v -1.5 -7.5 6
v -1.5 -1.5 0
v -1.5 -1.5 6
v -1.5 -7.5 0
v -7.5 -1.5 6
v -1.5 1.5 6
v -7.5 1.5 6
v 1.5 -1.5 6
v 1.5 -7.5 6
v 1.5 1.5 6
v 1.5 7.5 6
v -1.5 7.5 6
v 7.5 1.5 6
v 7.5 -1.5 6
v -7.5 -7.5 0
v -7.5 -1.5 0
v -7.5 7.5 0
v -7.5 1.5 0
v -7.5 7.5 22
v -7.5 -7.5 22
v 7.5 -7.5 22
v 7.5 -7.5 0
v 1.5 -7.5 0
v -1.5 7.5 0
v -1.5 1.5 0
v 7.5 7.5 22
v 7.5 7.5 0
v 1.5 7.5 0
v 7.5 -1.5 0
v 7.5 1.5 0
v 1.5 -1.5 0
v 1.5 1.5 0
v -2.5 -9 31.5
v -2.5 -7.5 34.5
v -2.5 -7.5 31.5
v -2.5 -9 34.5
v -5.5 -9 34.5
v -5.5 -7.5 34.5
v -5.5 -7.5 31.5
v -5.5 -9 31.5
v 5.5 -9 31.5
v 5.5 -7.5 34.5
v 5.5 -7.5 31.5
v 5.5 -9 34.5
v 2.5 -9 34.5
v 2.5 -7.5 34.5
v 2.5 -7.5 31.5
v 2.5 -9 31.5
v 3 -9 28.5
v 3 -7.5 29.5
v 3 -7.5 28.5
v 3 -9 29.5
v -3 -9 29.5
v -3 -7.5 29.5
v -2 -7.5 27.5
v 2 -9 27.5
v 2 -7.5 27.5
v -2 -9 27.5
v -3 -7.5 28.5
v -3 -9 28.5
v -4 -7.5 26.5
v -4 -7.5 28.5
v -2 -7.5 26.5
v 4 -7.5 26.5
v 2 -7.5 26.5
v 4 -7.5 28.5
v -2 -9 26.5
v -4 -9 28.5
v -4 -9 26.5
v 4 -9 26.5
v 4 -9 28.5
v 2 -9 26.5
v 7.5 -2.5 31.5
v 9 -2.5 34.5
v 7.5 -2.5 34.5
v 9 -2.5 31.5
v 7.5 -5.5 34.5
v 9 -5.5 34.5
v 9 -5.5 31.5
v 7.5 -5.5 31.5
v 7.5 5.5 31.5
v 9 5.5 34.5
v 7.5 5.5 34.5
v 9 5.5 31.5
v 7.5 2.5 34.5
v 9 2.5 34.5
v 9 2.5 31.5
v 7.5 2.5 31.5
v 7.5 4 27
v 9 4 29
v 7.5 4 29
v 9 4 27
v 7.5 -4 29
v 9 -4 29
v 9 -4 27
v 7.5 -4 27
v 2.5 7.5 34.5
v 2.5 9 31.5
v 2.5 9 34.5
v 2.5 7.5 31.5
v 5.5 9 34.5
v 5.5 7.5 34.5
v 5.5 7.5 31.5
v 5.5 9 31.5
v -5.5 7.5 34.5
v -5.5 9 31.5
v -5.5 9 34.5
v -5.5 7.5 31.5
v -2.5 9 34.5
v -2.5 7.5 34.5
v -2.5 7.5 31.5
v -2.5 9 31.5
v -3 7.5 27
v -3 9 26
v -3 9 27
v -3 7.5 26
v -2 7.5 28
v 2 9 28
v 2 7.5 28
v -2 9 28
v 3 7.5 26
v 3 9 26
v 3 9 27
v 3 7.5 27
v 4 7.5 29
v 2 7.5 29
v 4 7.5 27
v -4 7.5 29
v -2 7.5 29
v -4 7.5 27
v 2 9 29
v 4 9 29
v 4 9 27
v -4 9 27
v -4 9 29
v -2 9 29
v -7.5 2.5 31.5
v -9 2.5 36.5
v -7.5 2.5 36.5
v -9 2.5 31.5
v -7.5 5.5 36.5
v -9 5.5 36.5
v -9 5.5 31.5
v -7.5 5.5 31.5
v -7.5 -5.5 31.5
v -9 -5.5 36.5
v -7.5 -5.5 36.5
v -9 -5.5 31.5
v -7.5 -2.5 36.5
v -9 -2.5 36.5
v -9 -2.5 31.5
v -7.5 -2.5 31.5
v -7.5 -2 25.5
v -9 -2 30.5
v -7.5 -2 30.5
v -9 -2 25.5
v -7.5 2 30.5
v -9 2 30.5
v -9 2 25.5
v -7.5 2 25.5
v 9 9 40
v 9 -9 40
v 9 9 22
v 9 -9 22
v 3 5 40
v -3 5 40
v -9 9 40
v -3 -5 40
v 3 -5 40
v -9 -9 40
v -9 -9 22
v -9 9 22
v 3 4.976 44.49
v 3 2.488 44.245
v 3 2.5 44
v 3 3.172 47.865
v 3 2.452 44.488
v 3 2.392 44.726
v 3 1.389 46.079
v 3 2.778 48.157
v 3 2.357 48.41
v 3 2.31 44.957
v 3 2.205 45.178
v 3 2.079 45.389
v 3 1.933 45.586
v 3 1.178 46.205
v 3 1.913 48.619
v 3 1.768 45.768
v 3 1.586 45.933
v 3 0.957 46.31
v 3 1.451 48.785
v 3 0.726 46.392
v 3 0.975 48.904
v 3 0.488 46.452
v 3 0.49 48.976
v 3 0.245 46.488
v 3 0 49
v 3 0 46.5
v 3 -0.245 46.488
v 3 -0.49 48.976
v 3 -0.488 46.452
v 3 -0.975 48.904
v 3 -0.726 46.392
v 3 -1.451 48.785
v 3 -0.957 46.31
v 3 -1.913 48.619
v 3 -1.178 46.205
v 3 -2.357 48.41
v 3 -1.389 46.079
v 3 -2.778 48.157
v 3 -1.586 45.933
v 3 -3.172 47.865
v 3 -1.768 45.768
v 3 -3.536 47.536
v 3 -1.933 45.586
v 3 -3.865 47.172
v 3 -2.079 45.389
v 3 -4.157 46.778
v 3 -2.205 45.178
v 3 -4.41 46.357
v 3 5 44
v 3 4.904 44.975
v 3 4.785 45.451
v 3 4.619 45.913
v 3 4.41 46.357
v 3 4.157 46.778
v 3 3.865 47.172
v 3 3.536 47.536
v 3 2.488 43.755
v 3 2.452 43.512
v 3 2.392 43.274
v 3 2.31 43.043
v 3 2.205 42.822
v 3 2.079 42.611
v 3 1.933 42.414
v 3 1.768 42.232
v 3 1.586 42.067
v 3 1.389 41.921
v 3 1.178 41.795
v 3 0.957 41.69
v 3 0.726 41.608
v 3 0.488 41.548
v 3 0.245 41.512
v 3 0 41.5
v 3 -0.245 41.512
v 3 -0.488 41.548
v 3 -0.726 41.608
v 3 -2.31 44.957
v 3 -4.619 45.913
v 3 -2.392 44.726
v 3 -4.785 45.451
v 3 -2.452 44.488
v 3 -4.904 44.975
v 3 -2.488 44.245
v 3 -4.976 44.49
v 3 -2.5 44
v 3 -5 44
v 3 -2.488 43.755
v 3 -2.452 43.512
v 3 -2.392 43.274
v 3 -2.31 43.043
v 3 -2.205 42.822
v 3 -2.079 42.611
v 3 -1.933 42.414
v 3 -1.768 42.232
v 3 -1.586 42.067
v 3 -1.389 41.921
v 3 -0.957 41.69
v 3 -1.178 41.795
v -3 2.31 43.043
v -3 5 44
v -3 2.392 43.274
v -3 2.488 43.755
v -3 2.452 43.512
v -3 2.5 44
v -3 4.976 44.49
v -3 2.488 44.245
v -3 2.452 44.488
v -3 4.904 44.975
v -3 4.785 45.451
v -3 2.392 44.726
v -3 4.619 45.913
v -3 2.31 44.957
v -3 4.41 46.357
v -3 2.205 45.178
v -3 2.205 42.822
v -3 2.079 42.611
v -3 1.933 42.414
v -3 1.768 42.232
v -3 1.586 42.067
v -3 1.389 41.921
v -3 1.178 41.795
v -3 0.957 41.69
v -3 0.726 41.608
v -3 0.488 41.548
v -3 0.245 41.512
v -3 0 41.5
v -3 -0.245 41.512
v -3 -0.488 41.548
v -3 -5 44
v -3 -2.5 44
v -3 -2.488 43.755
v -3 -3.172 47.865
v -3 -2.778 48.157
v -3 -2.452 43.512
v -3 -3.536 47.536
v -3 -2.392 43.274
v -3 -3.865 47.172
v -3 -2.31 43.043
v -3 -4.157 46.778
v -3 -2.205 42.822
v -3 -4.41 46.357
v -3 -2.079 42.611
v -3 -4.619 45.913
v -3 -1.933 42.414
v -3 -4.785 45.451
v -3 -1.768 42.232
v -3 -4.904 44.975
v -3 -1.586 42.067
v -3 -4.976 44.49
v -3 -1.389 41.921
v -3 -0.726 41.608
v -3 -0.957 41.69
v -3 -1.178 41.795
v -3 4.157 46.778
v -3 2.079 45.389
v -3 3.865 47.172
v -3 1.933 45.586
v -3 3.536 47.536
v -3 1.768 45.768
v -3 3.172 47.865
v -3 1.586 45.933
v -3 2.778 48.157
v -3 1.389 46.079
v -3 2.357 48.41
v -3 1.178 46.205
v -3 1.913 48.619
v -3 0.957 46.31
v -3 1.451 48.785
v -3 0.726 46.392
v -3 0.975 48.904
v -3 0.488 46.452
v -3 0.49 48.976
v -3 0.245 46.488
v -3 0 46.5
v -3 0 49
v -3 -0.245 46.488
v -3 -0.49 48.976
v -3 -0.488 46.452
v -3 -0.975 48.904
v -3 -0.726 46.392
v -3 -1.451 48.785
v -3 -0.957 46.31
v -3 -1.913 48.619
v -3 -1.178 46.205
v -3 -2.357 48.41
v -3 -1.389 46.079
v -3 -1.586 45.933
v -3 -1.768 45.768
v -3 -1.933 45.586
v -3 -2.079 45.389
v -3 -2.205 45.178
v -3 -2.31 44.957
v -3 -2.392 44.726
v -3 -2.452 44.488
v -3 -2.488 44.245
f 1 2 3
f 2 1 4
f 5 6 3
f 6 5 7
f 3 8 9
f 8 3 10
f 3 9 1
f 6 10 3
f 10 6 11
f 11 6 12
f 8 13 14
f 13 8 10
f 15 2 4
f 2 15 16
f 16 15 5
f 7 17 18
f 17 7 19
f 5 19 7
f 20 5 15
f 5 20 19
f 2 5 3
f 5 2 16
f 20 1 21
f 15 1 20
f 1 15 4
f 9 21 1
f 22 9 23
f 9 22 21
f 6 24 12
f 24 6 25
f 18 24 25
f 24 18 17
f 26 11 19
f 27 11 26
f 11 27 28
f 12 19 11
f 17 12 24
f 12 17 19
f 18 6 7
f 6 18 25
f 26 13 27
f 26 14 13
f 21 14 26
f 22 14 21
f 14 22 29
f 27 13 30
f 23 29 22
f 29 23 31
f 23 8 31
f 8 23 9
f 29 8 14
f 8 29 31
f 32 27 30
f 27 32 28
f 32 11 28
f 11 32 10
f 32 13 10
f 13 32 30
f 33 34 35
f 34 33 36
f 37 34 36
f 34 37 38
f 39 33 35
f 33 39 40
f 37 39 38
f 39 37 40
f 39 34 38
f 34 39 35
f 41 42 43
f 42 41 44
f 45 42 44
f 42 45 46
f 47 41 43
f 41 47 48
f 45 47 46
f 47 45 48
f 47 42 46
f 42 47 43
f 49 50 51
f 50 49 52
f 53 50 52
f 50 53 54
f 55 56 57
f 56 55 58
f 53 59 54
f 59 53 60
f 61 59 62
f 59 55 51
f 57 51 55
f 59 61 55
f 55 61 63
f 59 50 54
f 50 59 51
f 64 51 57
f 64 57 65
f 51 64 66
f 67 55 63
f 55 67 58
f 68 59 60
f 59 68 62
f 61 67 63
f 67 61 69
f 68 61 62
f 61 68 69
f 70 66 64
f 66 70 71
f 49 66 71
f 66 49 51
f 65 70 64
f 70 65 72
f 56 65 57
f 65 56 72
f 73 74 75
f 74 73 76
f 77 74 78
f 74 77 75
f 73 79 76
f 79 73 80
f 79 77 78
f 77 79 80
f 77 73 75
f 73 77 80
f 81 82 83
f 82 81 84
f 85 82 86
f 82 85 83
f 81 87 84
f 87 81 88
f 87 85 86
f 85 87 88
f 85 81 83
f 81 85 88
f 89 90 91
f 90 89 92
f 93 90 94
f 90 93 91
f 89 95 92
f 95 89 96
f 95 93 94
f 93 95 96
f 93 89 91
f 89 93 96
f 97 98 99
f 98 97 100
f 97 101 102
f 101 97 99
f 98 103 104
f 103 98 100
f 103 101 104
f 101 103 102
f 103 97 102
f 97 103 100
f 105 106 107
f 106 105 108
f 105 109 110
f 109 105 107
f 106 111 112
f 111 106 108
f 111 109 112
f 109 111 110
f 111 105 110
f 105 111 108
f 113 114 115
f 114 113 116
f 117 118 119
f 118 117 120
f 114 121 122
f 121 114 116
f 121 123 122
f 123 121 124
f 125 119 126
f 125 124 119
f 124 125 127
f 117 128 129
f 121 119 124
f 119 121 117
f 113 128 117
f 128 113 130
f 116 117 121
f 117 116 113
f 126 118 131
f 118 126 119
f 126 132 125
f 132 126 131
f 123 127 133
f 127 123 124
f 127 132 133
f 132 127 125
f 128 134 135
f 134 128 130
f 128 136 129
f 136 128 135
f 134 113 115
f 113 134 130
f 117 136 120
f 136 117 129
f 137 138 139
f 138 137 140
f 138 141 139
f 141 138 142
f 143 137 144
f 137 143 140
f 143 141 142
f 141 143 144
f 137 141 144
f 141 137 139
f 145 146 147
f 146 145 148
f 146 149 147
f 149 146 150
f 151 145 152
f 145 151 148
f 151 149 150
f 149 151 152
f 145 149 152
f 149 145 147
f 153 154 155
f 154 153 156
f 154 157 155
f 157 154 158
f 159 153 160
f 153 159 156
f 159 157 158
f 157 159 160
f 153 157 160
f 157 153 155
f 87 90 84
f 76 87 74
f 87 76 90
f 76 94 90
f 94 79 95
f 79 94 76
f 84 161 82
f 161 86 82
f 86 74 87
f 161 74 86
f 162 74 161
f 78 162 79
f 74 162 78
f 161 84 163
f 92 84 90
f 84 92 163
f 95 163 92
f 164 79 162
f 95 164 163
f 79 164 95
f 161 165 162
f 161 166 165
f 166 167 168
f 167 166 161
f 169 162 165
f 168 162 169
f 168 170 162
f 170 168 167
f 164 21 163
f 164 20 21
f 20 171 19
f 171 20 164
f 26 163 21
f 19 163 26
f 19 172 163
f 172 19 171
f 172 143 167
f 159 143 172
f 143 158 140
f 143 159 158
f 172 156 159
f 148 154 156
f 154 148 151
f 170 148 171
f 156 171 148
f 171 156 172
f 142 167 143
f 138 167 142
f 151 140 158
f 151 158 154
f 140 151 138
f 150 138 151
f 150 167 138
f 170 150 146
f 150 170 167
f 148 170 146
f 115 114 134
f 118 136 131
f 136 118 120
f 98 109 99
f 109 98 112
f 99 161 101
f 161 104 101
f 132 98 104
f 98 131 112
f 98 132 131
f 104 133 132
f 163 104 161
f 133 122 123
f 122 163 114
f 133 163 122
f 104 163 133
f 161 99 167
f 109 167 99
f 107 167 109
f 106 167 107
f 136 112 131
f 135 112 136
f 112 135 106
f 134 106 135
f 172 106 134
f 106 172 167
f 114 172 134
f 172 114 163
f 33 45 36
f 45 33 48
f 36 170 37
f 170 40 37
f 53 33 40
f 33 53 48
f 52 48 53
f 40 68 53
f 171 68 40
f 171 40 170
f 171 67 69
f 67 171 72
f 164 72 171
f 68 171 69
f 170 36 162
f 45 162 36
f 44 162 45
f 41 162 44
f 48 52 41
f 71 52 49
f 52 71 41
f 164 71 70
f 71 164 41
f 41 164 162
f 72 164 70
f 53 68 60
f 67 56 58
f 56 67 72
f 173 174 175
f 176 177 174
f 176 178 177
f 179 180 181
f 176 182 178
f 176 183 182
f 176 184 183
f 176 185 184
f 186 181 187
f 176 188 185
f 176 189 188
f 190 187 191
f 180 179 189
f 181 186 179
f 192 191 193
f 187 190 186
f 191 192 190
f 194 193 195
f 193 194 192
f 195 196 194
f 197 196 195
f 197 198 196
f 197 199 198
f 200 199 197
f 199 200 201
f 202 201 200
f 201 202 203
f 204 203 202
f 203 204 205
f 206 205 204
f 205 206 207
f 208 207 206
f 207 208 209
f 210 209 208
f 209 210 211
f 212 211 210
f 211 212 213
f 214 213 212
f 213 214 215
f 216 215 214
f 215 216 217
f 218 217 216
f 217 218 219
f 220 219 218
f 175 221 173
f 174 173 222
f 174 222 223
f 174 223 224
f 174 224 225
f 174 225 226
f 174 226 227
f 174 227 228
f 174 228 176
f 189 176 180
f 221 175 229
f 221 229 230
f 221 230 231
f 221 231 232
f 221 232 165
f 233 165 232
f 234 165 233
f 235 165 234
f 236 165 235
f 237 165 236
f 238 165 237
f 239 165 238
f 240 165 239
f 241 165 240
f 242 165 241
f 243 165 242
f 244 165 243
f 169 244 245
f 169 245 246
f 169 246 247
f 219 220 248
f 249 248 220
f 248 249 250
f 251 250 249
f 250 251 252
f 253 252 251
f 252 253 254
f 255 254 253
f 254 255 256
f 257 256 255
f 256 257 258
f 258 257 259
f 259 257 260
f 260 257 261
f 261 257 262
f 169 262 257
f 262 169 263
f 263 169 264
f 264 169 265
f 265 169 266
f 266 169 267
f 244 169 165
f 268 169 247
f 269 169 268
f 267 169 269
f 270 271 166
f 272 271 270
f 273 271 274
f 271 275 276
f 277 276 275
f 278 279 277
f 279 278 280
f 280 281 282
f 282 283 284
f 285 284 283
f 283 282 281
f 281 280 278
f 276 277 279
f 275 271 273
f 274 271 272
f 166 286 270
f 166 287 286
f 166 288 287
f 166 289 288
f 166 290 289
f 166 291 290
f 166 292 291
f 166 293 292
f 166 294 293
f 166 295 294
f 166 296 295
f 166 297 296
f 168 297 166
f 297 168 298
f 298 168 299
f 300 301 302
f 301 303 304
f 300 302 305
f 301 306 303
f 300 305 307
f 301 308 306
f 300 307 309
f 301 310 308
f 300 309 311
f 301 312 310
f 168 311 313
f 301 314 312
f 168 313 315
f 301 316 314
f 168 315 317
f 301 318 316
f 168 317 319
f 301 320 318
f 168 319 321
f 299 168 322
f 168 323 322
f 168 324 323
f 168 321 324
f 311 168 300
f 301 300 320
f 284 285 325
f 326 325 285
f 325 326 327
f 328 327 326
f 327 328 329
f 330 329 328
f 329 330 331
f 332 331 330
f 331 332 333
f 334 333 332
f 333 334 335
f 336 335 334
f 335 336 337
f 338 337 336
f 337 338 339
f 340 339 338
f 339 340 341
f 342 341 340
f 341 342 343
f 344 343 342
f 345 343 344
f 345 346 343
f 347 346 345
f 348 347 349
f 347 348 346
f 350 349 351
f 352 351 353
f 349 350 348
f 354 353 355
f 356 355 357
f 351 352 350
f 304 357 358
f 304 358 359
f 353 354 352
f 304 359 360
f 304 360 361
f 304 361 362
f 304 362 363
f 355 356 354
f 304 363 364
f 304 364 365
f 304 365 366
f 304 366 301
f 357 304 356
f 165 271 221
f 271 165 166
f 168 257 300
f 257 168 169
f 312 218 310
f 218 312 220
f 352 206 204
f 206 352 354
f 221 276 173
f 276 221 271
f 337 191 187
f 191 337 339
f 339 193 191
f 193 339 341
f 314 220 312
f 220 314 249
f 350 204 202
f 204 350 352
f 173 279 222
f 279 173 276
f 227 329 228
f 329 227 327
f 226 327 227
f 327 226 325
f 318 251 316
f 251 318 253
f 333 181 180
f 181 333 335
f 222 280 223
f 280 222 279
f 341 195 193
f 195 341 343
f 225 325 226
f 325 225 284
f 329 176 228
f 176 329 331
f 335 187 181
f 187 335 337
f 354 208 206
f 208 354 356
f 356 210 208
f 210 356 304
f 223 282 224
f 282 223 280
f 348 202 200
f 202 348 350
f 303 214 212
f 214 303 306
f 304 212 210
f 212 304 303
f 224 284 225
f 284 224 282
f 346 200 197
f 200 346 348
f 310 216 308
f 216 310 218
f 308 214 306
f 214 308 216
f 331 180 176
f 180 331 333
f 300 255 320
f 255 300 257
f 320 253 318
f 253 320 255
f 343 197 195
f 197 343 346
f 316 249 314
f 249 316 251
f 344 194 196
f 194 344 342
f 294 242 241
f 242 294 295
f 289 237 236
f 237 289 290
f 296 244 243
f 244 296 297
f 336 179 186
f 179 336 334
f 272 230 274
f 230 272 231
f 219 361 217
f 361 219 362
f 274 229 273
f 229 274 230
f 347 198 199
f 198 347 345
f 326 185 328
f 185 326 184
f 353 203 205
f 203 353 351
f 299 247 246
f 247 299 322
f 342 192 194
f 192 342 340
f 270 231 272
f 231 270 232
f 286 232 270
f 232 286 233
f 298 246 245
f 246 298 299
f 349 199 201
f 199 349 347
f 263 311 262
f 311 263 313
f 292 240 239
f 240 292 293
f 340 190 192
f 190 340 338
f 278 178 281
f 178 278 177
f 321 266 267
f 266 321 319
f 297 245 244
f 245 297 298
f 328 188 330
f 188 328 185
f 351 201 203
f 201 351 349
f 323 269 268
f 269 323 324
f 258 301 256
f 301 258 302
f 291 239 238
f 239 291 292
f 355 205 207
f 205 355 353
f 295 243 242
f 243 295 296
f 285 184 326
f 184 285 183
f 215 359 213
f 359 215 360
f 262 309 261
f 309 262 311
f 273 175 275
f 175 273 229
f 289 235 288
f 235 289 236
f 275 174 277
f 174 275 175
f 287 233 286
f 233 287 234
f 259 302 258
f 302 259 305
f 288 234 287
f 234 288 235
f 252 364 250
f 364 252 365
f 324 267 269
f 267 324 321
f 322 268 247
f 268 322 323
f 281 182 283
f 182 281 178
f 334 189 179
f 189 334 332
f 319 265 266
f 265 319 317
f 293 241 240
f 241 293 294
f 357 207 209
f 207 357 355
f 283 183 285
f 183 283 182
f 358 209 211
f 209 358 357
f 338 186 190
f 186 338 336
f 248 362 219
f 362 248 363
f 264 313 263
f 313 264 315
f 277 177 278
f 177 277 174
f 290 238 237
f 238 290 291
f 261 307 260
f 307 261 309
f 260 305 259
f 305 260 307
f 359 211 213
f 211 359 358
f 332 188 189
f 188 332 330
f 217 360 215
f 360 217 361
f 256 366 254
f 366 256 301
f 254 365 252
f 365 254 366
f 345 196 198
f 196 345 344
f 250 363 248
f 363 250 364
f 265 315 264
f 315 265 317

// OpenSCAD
/*
 * Emotional Communication Keychain (Surprised Update)
 * Version: 0.16
 */

$fn = 64;

// --- Parameters ---
body_w = 15;         
body_d = 15;         
total_h = 40;        

head_size = 18;      
leg_h = 6;           
leg_w = 6;           

attach_w = 6;        
attach_d = 10;       
attach_h = 4;        
hole_r = 2.5;        

// --- Calculated Z-Heights ---
body_h = total_h - head_size - leg_h;

z_leg = leg_h / 2;
z_body = leg_h + (body_h / 2);
z_head = leg_h + body_h + (head_size / 2);
z_attach = leg_h + body_h + head_size; 

f_y = -head_size / 2;
f_d = 3; 

// --- Face Modules ---

module face_sad() {
    translate([-4, f_y, 2]) cube([3, f_d, 3], center=true); 
    translate([4, f_y, 2]) cube([3, f_d, 3], center=true);
    translate([0, f_y, -2.5]) cube([6, f_d, 2], center=true); 
    translate([-3, f_y, -3.5]) cube([2, f_d, 2], center=true); 
    translate([3, f_y, -3.5]) cube([2, f_d, 2], center=true); 
}

module face_meh() {
    translate([-4, f_y, 2]) cube([3, f_d, 3], center=true); 
    translate([4, f_y, 2]) cube([3, f_d, 3], center=true);
    translate([0, f_y, -3]) cube([8, f_d, 2], center=true); 
}

module face_smily() {
    translate([-4, f_y, 2]) cube([3, f_d, 3], center=true); 
    translate([4, f_y, 2]) cube([3, f_d, 3], center=true);
    translate([0, f_y, -4]) cube([6, f_d, 2], center=true); 
    translate([-3, f_y, -3]) cube([2, f_d, 2], center=true); 
    translate([3, f_y, -3]) cube([2, f_d, 2], center=true); 
}

module face_surprised() {
    // Tall eyes for a "wide-eyed" look
    translate([-4, f_y, 3]) cube([3, f_d, 5], center=true);
    translate([4, f_y, 3]) cube([3, f_d, 5], center=true);
    // Tall rectangular "O" mouth
    translate([0, f_y, -3]) cube([4, f_d, 5], center=true);
}

// --- Main Assembly ---
module comms_keychain() {
    
    // 1. Four Legs
    for (x = [-1, 1]) {
        for (y = [-1, 1]) {
            translate([x * (body_w/2 - leg_w/2), y * (body_d/2 - leg_w/2), z_leg])
                cube([leg_w, leg_w, leg_h], center=true);
        }
    }

    // 2. Body
    translate([0, 0, z_body]) {
        cube([body_w, body_d, body_h], center=true);
    }

    // 3. Head with 4 Moods
    translate([0, 0, z_head]) {
        difference() {
            cube([head_size, head_size, head_size], center=true);
            rotate([0, 0, 0]) face_sad();       
            rotate([0, 0, 90]) face_meh();      
            rotate([0, 0, 180]) face_smily();   
            rotate([0, 0, 270]) face_surprised(); 
        }
    }

    // 4. Keyring Attachment
    translate([0, 0, z_attach]) {
        difference() {
            union() {
                translate([0, 0, attach_h / 2])
                    cube([attach_w, attach_d, attach_h], center=true);
                translate([0, 0, attach_h])
                    rotate([0, 90, 0])
                    cylinder(h=attach_w, d=attach_d, center=true);
            }
            translate([0, 0, attach_h])
                rotate([0, 90, 0])
                cylinder(h=attach_w + 2, r=hole_r, center=true);
        }
    }
}

comms_keychain();
